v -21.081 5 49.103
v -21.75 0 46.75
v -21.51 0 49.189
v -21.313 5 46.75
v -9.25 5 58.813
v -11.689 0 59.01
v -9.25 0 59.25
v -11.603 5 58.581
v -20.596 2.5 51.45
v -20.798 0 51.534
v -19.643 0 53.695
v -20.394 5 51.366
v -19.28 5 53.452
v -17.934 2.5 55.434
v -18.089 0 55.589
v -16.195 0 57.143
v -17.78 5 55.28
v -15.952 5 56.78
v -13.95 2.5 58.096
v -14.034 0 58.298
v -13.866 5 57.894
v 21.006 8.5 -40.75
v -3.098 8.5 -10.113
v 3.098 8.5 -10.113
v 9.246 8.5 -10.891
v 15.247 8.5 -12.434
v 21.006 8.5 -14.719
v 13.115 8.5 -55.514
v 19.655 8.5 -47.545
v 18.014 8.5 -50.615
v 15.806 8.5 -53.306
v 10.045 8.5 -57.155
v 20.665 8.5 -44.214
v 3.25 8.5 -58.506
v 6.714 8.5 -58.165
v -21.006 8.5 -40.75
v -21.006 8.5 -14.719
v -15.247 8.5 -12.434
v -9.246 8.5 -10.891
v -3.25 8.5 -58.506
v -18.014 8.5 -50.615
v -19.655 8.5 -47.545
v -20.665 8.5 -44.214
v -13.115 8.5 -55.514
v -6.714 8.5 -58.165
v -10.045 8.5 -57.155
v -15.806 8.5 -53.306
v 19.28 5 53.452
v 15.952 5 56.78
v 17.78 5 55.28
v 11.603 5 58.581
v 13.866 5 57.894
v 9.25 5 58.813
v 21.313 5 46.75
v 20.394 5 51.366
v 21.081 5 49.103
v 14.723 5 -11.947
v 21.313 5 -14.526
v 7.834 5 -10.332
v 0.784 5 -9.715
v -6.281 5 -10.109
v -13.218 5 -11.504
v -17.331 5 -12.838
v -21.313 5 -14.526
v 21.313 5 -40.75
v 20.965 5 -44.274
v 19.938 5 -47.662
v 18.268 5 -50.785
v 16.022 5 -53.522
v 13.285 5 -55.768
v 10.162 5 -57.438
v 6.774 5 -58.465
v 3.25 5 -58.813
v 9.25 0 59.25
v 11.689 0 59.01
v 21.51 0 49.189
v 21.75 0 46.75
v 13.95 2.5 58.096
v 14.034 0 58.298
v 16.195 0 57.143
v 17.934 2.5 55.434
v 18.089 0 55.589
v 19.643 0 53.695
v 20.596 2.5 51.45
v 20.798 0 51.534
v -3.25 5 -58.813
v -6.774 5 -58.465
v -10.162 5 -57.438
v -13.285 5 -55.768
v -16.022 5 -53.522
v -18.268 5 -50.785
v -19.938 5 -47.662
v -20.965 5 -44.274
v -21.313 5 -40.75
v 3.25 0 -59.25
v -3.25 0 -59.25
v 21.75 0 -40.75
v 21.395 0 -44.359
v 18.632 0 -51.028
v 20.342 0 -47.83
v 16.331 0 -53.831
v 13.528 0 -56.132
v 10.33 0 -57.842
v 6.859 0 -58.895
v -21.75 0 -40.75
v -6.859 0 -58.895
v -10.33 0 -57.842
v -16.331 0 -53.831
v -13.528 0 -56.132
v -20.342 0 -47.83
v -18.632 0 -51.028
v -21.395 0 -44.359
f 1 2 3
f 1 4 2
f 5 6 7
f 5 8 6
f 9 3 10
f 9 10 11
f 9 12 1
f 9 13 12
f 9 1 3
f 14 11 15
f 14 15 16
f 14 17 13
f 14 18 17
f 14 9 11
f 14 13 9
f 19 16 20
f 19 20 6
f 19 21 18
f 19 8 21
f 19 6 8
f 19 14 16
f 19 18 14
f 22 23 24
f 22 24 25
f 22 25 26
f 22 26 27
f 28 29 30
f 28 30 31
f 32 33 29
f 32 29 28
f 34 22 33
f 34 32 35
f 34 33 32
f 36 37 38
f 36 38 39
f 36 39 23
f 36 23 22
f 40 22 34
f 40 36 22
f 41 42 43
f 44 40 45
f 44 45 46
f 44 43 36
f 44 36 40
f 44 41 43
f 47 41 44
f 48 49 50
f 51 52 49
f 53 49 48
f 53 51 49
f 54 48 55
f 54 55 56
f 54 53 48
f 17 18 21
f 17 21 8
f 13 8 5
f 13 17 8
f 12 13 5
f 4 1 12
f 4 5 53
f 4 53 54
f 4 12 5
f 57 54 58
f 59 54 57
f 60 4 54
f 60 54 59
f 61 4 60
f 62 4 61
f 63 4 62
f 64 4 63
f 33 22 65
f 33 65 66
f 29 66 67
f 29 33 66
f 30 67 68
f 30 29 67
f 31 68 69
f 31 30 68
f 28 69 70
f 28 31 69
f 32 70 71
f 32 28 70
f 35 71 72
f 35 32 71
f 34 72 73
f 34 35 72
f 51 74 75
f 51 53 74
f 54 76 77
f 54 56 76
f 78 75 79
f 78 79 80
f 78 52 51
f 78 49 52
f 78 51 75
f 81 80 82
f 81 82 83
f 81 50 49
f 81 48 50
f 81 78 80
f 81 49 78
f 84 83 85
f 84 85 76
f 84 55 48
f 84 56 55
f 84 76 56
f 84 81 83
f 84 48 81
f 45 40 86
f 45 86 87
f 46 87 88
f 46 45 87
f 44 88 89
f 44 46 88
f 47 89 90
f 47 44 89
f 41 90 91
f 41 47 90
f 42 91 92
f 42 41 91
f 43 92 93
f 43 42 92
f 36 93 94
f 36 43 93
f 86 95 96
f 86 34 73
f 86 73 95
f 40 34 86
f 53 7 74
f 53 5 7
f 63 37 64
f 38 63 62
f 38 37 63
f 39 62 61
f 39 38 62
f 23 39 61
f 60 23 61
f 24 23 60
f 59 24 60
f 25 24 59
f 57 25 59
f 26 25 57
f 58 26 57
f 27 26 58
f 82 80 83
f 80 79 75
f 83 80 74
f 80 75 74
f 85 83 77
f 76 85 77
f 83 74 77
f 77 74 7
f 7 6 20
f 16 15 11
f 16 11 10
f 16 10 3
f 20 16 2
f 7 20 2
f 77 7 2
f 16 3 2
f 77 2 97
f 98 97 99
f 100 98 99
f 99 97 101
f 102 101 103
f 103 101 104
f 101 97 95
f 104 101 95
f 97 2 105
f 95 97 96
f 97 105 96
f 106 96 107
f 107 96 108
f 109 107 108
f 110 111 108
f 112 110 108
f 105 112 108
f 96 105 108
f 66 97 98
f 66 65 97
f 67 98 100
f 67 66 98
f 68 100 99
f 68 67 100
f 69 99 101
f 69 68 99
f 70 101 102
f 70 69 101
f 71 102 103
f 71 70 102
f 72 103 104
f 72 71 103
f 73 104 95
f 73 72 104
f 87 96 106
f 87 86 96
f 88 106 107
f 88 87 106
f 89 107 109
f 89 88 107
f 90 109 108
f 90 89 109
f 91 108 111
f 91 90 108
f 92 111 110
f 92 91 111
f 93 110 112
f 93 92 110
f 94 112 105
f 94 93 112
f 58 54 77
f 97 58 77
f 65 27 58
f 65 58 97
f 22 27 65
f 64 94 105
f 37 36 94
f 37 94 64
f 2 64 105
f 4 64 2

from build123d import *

# Parameters (mm, degrees)
BOSS_EXTRUDE1_DEPTH = 5
BOSS_EXTRUDE1_TAPER = 5
BOSS_EXTRUDE2_DEPTH = 8.5
BOSS_EXTRUDE2_TAPER = 5


with BuildPart() as part:
    # Sketch1 → Boss-Extrude1 (new body)
    with BuildSketch(Plane(origin=(0, 0, 0), x_dir=(1, 0, 0), z_dir=(0, 1, 0))):
        with BuildLine():
            ThreePointArc((-3.25, 59.25), (-16.331475452, 53.831475452), (-21.75, 40.75))
            Line((-21.75, 40.75), (-21.75, -46.75))
            ThreePointArc((-21.75, -46.75), (-18.088834765, -55.588834765), (-9.25, -59.25))
            Line((-9.25, -59.25), (9.25, -59.25))
            ThreePointArc((9.25, -59.25), (18.088834765, -55.588834765), (21.75, -46.75))
            Line((21.75, -46.75), (21.75, 40.75))
            ThreePointArc((21.75, 40.75), (16.331475452, 53.831475452), (3.25, 59.25))
            Line((3.25, 59.25), (-3.25, 59.25))
        make_face()
    extrude(amount=BOSS_EXTRUDE1_DEPTH, taper=BOSS_EXTRUDE1_TAPER)

    # Sketch1<3> → Boss-Extrude2 (add)
    with BuildSketch(Plane(origin=(0, 0, 0), x_dir=(1, 0, 0), z_dir=(0, 1, 0))):
        with BuildLine():
            Line((3.25, 59.25), (-3.25, 59.25))
            ThreePointArc((-3.25, 59.25), (-16.331475452, 53.831475452), (-21.75, 40.75))
            Line((-21.75, 40.75), (-21.75, 14.25))
            ThreePointArc((-21.75, 14.25), (0, 9.271522631), (21.75, 14.25))
            Line((21.75, 14.25), (21.75, 40.75))
            ThreePointArc((21.75, 40.75), (16.331475452, 53.831475452), (3.25, 59.25))
        make_face()
    extrude(amount=BOSS_EXTRUDE2_DEPTH, taper=BOSS_EXTRUDE2_TAPER)


solid = part.part
